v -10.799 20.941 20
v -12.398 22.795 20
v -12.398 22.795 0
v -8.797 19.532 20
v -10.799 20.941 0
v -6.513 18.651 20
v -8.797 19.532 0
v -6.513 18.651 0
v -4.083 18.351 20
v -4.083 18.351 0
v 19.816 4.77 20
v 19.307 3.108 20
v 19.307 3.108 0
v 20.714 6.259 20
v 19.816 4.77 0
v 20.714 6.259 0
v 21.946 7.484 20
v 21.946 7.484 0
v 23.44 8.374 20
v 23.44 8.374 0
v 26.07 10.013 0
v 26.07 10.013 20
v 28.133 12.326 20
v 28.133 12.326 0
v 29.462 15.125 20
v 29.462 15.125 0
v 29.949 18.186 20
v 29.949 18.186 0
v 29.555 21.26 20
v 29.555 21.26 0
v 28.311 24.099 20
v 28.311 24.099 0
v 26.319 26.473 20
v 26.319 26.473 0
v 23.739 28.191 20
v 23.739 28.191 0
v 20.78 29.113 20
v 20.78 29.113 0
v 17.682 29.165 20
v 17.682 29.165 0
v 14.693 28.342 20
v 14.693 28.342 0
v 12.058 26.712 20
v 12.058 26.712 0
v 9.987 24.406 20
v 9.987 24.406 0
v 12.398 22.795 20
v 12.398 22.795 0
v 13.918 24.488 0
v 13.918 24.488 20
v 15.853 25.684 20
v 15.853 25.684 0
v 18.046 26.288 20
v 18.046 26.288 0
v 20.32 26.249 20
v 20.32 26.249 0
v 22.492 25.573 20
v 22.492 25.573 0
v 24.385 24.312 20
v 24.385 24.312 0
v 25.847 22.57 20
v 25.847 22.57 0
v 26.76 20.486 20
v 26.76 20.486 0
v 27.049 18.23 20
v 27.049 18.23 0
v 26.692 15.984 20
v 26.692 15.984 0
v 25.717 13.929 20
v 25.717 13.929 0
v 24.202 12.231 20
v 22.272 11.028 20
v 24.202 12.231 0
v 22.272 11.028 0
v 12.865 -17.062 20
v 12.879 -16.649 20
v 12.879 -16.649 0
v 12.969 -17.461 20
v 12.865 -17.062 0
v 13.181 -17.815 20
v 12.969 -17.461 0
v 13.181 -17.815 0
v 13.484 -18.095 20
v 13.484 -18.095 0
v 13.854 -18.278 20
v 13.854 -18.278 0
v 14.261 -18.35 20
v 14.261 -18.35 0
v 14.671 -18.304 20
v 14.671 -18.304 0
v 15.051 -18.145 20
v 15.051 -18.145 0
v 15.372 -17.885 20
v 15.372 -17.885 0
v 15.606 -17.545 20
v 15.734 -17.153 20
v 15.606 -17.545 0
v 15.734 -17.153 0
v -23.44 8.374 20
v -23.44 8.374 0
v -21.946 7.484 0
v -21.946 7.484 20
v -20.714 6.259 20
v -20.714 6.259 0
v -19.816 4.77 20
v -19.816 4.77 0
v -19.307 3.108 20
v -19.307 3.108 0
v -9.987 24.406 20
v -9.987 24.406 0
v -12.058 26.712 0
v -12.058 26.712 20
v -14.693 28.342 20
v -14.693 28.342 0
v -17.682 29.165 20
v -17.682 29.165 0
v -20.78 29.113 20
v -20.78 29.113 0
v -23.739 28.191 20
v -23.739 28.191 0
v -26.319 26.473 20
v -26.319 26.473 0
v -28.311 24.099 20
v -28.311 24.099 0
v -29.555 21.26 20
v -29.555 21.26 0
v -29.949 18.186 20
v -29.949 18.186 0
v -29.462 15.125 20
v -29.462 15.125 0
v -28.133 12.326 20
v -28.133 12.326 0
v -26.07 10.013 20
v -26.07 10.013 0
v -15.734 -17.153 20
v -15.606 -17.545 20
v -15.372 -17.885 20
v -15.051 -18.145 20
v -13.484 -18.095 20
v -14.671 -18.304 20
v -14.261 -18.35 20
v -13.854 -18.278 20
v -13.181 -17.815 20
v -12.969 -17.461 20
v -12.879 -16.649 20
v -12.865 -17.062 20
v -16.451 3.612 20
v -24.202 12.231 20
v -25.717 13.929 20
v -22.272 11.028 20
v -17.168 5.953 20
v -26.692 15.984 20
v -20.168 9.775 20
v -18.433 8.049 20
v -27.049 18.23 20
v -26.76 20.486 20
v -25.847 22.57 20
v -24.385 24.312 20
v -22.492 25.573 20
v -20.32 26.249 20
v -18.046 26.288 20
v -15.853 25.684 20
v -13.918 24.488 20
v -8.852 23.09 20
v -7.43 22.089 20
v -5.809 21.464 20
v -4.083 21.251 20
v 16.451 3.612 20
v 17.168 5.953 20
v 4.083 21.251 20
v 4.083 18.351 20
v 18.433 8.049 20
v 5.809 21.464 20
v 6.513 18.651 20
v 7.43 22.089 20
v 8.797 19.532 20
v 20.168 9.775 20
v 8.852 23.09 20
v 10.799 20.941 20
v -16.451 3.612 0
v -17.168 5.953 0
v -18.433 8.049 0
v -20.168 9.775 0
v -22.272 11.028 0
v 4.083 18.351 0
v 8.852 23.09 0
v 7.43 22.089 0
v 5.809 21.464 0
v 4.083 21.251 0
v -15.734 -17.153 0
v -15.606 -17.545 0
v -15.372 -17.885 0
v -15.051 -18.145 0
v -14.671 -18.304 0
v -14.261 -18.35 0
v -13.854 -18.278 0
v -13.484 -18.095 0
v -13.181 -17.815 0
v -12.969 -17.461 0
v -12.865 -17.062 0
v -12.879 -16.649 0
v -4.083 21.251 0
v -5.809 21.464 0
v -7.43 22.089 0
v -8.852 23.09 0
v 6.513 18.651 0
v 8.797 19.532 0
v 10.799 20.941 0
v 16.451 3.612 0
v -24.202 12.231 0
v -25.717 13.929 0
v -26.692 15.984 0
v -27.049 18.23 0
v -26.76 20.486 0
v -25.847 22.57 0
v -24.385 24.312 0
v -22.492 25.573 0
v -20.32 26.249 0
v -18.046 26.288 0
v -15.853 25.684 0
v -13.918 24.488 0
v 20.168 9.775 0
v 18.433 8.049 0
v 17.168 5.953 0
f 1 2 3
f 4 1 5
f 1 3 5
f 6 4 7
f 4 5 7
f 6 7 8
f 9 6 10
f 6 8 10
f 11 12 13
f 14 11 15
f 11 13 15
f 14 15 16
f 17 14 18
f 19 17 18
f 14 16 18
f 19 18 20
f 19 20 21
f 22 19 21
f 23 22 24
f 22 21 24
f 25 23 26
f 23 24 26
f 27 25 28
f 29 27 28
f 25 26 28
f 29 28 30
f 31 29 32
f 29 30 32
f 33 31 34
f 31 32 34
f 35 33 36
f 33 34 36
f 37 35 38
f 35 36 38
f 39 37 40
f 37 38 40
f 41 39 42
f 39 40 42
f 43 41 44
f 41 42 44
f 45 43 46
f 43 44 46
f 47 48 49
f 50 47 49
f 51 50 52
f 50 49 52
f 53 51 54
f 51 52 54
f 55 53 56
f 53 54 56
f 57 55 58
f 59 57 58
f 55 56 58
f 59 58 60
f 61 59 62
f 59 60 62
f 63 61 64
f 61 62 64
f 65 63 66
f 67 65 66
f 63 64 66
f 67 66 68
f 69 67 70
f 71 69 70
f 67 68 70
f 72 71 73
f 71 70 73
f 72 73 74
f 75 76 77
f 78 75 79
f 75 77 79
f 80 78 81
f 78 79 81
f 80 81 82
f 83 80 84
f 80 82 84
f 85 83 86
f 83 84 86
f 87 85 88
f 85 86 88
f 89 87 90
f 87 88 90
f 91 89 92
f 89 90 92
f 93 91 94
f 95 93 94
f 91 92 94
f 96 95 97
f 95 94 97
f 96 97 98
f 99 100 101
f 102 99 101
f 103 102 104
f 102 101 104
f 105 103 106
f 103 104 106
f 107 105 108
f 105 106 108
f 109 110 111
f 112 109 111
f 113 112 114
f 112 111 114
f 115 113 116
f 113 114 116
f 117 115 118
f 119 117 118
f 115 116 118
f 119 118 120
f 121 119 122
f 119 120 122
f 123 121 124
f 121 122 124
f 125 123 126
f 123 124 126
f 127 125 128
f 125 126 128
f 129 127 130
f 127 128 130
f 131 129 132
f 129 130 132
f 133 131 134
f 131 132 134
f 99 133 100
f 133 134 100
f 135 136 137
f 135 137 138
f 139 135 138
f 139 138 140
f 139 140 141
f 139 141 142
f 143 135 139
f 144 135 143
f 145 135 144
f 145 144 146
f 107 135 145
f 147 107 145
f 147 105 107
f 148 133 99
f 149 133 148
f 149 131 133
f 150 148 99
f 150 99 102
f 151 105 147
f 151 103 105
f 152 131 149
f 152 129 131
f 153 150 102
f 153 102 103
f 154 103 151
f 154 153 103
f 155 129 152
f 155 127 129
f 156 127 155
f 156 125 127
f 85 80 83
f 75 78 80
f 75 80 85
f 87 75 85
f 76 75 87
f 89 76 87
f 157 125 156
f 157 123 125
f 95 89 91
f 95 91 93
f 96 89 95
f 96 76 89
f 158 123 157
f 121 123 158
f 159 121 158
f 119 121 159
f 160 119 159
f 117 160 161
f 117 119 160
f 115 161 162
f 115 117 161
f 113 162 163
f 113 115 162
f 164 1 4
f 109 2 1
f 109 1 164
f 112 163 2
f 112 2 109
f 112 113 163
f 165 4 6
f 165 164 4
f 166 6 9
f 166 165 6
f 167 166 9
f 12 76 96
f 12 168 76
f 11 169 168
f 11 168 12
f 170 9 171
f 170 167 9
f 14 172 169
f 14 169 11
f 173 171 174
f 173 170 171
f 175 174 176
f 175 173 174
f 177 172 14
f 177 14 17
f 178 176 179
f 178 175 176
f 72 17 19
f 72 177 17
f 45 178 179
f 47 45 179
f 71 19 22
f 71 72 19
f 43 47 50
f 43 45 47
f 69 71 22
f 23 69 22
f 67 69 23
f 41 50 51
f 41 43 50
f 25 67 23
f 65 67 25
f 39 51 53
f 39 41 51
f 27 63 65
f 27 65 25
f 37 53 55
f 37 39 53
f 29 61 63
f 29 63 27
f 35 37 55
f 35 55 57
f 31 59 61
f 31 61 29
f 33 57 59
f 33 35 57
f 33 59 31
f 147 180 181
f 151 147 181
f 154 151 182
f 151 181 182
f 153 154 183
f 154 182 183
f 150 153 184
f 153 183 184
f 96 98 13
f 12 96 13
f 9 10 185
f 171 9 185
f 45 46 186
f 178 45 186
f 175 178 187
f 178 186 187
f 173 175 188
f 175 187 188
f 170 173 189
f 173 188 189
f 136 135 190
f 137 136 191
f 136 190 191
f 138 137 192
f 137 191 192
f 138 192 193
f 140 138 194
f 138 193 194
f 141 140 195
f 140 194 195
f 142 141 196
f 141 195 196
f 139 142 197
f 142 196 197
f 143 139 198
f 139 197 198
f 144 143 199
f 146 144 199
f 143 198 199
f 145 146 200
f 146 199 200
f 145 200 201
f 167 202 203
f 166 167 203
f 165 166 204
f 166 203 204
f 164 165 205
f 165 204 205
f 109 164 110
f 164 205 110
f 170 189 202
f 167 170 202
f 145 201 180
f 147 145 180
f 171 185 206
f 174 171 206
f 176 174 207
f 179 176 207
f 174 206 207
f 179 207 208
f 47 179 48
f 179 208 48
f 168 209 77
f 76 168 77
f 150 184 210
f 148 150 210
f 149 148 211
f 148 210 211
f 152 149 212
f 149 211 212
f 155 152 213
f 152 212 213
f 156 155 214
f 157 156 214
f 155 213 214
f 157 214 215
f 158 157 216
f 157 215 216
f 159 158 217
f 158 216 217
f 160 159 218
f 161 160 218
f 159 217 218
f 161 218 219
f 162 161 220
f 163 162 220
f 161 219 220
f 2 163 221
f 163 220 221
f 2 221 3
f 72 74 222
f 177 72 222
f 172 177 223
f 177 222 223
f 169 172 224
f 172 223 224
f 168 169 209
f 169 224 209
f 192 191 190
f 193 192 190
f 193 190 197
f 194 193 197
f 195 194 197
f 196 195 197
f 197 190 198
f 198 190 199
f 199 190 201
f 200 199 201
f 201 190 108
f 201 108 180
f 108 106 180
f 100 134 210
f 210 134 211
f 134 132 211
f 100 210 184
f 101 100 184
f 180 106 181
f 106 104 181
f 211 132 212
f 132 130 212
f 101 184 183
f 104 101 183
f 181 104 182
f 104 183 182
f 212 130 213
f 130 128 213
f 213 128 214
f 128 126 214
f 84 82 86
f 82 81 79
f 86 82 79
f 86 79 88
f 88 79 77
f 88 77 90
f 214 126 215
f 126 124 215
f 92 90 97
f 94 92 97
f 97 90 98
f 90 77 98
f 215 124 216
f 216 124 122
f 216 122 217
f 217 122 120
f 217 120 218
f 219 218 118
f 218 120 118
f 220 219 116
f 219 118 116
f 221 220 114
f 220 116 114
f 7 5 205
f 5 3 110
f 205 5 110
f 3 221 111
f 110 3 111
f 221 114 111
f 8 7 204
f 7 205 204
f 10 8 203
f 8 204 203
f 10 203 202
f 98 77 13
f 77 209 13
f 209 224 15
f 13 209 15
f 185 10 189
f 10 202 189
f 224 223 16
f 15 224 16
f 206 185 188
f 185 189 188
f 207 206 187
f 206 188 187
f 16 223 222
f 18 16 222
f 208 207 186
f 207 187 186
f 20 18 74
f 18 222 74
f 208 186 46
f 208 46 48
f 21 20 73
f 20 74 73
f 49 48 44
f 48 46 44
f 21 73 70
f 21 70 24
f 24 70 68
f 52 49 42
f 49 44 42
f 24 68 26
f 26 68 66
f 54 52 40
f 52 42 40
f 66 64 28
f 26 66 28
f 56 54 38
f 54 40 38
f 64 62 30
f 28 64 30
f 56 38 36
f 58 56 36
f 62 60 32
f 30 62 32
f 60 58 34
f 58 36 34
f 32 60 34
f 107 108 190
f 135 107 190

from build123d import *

# Parameters (mm, degrees)
F1_DEPTH = 20


with BuildPart() as f1:
    # F0 (on Top) → F1 (new body)
    with BuildSketch(Plane.XY):
        with BuildLine():
            Line((-4.08337, 18.350895), (0, 18.350895))
            Line((0, 18.350895), (4.08337, 18.350895))
            ThreePointArc((4.08337, 18.350895), (8.797416, 19.531724), (12.398165, 22.795339))
            ThreePointArc((12.398165, 22.795339), (25.178356, 23.493196), (22.271844, 11.028346))
            ThreePointArc((22.271844, 11.028346), (18.432547, 8.049022), (16.451072, 3.611642))
            Line((16.451072, 3.611642), (12.878556, -16.649105))
            ThreePointArc((12.878556, -16.649105), (14.054737, -18.328866), (15.734498, -17.152685))
            Line((15.734498, -17.152685), (19.307015, 3.108062))
            ThreePointArc((19.307015, 3.108062), (20.713862, 6.258602), (23.439763, 8.373922))
            ThreePointArc((23.439763, 8.373922), (27.399884, 25.35728), (9.986874, 24.40645))
            ThreePointArc((9.986874, 24.40645), (7.430343, 22.089283), (4.08337, 21.250895))
            Line((4.08337, 21.250895), (0, 21.250895))
            Line((0, 21.250895), (-4.08337, 21.250895))
            ThreePointArc((-4.08337, 21.250895), (-7.430343, 22.089283), (-9.986874, 24.40645))
            ThreePointArc((-9.986874, 24.40645), (-27.399884, 25.35728), (-23.439763, 8.373922))
            ThreePointArc((-23.439763, 8.373922), (-20.713862, 6.258602), (-19.307015, 3.108062))
            Line((-19.307015, 3.108062), (-15.734498, -17.152685))
            ThreePointArc((-15.734498, -17.152685), (-14.054737, -18.328866), (-12.878556, -16.649105))
            Line((-12.878556, -16.649105), (-16.451072, 3.611642))
            ThreePointArc((-16.451072, 3.611642), (-18.432547, 8.049022), (-22.271844, 11.028346))
            ThreePointArc((-22.271844, 11.028346), (-25.178356, 23.493196), (-12.398165, 22.795339))
            ThreePointArc((-12.398165, 22.795339), (-8.797416, 19.531724), (-4.08337, 18.350895))
        make_face()
    extrude(amount=F1_DEPTH)


solid = f1.part
